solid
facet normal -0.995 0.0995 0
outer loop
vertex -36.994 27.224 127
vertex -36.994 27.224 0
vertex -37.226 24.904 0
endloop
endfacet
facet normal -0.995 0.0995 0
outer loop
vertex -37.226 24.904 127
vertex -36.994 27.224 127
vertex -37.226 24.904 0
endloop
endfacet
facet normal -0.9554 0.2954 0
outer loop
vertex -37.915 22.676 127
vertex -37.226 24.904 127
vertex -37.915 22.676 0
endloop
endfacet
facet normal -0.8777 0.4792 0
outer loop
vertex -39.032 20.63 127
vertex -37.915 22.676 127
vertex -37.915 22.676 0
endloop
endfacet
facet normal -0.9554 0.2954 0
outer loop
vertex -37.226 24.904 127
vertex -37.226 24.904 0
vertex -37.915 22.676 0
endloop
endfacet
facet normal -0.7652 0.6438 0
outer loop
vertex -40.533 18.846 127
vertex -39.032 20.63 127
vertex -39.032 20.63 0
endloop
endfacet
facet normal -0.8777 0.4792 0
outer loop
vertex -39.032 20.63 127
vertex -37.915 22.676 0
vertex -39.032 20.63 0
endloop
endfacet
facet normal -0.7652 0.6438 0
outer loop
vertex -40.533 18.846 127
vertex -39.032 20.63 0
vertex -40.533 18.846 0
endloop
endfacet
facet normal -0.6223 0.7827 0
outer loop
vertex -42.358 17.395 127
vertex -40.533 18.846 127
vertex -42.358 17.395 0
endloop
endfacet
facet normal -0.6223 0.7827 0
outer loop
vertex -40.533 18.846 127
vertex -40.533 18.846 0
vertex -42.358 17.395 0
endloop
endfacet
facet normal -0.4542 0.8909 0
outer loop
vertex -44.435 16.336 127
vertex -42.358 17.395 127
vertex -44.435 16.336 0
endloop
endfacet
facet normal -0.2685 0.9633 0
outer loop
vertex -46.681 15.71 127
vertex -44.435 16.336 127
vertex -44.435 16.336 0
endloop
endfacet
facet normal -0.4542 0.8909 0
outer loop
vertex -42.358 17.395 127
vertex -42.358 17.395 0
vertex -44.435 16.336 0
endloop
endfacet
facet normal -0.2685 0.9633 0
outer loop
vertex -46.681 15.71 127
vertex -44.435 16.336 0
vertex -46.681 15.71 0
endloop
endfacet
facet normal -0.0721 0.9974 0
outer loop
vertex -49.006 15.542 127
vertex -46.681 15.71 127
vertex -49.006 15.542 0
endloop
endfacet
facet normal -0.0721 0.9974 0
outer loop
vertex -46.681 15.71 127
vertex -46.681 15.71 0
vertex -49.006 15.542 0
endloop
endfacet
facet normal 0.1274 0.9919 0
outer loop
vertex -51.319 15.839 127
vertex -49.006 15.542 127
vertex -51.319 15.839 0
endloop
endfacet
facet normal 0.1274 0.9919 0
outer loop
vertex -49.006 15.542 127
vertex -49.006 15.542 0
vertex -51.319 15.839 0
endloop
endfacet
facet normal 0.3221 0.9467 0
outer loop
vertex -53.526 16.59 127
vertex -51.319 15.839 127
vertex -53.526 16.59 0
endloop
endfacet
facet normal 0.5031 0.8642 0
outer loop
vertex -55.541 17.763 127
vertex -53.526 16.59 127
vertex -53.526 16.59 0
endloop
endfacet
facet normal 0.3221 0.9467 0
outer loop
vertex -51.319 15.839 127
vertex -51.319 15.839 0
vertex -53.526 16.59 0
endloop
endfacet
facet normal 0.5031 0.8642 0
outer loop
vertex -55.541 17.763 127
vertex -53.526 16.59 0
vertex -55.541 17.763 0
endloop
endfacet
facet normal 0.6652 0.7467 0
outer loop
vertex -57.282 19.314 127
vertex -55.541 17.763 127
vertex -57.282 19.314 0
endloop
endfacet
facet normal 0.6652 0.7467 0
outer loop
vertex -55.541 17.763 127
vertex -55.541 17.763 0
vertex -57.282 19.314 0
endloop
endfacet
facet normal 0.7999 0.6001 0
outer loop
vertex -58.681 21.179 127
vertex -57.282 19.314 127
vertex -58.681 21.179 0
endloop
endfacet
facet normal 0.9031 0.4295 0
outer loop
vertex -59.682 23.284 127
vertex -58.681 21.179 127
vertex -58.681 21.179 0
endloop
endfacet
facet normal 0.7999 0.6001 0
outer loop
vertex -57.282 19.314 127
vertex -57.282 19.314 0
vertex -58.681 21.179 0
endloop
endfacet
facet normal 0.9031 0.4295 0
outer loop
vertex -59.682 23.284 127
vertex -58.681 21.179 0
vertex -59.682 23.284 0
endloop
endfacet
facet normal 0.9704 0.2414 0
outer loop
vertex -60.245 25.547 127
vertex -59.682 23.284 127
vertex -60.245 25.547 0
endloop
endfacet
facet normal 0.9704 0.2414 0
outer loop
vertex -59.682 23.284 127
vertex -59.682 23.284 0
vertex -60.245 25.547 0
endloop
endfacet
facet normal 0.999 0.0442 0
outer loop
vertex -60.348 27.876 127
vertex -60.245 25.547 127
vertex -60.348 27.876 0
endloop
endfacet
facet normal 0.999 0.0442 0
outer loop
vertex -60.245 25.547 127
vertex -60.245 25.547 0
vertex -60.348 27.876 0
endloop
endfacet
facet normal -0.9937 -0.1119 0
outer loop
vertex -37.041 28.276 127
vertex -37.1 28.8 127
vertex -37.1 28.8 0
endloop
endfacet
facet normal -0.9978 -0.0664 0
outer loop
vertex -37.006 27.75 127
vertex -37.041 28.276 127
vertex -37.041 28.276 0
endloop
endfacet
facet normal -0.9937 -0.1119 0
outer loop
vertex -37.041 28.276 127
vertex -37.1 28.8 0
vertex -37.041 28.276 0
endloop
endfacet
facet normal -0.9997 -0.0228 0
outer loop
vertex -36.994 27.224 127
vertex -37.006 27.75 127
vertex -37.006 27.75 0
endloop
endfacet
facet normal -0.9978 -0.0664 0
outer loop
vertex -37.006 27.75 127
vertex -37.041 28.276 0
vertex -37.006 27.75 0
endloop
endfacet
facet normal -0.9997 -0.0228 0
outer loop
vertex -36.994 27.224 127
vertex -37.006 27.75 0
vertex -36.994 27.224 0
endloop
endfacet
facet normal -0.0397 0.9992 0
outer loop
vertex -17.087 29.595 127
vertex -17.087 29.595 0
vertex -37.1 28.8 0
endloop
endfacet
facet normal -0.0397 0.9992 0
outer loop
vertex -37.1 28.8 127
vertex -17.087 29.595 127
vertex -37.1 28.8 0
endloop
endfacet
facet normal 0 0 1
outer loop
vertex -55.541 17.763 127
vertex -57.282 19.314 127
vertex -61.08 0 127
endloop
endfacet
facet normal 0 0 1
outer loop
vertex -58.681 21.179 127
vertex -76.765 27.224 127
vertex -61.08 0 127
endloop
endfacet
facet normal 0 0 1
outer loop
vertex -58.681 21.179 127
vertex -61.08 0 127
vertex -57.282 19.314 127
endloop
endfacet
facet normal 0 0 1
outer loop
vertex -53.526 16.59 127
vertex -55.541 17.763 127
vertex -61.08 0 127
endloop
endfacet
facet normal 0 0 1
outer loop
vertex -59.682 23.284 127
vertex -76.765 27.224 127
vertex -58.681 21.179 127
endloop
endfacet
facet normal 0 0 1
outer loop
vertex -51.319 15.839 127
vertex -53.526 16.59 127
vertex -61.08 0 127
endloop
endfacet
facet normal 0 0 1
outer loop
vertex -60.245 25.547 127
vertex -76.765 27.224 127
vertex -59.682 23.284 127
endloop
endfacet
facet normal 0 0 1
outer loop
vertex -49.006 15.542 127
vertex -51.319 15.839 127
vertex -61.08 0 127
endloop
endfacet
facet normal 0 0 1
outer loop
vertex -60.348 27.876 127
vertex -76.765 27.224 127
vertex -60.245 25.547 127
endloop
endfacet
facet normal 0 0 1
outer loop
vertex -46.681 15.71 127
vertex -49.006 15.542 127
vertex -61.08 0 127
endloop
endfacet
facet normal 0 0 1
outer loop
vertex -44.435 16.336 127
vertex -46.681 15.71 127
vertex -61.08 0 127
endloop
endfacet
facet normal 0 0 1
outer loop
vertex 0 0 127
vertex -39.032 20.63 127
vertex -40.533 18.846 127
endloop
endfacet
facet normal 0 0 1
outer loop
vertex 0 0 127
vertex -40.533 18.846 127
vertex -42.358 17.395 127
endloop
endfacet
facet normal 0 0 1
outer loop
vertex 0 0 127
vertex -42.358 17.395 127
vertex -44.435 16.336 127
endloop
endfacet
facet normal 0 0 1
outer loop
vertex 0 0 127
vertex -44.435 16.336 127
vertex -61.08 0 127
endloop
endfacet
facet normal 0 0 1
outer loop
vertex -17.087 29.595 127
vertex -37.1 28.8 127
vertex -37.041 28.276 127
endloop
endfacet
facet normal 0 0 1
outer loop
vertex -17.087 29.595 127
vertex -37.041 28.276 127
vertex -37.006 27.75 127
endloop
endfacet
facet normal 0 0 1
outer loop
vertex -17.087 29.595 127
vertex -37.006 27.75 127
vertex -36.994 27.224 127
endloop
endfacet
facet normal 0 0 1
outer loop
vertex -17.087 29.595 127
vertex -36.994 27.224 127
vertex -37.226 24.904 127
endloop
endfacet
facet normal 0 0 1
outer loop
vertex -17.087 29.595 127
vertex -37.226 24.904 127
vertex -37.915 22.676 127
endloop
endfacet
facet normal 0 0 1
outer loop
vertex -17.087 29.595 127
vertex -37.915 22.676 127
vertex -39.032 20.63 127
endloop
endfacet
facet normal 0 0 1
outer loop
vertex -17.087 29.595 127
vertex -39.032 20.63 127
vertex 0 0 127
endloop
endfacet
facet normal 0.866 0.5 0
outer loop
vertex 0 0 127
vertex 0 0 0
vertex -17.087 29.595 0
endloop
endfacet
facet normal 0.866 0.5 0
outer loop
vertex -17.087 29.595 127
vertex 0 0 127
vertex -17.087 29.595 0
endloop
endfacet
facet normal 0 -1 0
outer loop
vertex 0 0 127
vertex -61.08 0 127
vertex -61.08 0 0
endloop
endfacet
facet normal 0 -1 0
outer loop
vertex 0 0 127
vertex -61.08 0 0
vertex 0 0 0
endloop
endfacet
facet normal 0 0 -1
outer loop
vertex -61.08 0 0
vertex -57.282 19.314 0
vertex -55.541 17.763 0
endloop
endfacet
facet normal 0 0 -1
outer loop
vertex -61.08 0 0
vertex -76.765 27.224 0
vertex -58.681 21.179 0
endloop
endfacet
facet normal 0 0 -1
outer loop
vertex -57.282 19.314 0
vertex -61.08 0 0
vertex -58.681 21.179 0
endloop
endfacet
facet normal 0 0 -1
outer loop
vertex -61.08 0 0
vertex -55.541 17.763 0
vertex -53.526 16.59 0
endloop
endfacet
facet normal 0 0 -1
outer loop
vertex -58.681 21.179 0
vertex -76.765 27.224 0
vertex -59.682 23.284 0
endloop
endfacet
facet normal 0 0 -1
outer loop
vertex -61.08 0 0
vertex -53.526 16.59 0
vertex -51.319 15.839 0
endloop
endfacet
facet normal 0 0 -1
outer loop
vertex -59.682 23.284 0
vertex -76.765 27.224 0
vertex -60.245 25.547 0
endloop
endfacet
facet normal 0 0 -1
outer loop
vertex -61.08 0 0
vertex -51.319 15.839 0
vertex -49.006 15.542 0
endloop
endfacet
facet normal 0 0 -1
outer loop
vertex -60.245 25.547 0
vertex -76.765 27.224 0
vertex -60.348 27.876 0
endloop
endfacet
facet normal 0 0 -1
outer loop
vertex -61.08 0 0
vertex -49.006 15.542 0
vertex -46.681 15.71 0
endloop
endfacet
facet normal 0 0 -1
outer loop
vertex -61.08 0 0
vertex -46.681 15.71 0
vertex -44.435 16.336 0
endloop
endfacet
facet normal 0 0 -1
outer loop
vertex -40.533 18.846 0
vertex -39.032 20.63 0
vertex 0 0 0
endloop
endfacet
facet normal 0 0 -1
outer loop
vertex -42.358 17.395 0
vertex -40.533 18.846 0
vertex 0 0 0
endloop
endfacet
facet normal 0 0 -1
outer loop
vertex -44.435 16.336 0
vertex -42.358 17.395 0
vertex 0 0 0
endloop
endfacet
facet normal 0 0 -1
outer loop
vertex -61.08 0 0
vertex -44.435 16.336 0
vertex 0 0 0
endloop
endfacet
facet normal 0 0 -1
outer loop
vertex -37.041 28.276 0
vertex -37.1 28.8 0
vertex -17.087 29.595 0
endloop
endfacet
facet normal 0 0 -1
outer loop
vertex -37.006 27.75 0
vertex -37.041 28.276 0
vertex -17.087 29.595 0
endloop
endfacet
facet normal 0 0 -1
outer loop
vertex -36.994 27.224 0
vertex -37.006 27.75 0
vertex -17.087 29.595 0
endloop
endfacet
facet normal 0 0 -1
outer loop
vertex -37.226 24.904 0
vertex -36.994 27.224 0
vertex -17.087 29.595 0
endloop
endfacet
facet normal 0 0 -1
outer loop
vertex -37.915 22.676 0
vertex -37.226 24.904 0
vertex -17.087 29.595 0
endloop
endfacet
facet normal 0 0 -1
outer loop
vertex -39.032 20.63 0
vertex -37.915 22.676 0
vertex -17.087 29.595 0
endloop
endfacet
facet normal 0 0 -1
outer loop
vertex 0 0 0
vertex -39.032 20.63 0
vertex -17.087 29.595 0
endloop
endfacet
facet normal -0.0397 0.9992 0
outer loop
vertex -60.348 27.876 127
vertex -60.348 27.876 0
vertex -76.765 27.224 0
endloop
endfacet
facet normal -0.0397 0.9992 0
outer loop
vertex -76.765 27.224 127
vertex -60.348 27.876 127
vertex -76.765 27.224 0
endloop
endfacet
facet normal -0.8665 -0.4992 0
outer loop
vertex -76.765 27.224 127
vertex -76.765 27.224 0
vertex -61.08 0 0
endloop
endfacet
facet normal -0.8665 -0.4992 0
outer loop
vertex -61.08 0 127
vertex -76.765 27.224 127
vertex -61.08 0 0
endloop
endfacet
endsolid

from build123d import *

# Parameters (mm, degrees)
F1_DEPTH = 127


with BuildPart() as f1:
    # F0 (on Top) → F1 (new body)
    with BuildSketch(Plane.XY):
        with BuildLine():
            Line((-61.079588, 0), (0, 0))
            Line((0, 0), (-17.086972, 29.594812))
            Line((-17.086972, 29.594812), (-37.100383, 28.799639))
            ThreePointArc((-37.100383, 28.799639), (-37.020352, 28.013477), (-36.993634, 27.223703))
            ThreePointArc((-36.993634, 27.223703), (-49.006091, 15.542063), (-60.347805, 27.875973))
            Line((-60.347805, 27.875973), (-76.764559, 27.223703))
            Line((-76.764559, 27.223703), (-61.079588, 0))
        make_face()
    extrude(amount=F1_DEPTH)


solid = f1.part
